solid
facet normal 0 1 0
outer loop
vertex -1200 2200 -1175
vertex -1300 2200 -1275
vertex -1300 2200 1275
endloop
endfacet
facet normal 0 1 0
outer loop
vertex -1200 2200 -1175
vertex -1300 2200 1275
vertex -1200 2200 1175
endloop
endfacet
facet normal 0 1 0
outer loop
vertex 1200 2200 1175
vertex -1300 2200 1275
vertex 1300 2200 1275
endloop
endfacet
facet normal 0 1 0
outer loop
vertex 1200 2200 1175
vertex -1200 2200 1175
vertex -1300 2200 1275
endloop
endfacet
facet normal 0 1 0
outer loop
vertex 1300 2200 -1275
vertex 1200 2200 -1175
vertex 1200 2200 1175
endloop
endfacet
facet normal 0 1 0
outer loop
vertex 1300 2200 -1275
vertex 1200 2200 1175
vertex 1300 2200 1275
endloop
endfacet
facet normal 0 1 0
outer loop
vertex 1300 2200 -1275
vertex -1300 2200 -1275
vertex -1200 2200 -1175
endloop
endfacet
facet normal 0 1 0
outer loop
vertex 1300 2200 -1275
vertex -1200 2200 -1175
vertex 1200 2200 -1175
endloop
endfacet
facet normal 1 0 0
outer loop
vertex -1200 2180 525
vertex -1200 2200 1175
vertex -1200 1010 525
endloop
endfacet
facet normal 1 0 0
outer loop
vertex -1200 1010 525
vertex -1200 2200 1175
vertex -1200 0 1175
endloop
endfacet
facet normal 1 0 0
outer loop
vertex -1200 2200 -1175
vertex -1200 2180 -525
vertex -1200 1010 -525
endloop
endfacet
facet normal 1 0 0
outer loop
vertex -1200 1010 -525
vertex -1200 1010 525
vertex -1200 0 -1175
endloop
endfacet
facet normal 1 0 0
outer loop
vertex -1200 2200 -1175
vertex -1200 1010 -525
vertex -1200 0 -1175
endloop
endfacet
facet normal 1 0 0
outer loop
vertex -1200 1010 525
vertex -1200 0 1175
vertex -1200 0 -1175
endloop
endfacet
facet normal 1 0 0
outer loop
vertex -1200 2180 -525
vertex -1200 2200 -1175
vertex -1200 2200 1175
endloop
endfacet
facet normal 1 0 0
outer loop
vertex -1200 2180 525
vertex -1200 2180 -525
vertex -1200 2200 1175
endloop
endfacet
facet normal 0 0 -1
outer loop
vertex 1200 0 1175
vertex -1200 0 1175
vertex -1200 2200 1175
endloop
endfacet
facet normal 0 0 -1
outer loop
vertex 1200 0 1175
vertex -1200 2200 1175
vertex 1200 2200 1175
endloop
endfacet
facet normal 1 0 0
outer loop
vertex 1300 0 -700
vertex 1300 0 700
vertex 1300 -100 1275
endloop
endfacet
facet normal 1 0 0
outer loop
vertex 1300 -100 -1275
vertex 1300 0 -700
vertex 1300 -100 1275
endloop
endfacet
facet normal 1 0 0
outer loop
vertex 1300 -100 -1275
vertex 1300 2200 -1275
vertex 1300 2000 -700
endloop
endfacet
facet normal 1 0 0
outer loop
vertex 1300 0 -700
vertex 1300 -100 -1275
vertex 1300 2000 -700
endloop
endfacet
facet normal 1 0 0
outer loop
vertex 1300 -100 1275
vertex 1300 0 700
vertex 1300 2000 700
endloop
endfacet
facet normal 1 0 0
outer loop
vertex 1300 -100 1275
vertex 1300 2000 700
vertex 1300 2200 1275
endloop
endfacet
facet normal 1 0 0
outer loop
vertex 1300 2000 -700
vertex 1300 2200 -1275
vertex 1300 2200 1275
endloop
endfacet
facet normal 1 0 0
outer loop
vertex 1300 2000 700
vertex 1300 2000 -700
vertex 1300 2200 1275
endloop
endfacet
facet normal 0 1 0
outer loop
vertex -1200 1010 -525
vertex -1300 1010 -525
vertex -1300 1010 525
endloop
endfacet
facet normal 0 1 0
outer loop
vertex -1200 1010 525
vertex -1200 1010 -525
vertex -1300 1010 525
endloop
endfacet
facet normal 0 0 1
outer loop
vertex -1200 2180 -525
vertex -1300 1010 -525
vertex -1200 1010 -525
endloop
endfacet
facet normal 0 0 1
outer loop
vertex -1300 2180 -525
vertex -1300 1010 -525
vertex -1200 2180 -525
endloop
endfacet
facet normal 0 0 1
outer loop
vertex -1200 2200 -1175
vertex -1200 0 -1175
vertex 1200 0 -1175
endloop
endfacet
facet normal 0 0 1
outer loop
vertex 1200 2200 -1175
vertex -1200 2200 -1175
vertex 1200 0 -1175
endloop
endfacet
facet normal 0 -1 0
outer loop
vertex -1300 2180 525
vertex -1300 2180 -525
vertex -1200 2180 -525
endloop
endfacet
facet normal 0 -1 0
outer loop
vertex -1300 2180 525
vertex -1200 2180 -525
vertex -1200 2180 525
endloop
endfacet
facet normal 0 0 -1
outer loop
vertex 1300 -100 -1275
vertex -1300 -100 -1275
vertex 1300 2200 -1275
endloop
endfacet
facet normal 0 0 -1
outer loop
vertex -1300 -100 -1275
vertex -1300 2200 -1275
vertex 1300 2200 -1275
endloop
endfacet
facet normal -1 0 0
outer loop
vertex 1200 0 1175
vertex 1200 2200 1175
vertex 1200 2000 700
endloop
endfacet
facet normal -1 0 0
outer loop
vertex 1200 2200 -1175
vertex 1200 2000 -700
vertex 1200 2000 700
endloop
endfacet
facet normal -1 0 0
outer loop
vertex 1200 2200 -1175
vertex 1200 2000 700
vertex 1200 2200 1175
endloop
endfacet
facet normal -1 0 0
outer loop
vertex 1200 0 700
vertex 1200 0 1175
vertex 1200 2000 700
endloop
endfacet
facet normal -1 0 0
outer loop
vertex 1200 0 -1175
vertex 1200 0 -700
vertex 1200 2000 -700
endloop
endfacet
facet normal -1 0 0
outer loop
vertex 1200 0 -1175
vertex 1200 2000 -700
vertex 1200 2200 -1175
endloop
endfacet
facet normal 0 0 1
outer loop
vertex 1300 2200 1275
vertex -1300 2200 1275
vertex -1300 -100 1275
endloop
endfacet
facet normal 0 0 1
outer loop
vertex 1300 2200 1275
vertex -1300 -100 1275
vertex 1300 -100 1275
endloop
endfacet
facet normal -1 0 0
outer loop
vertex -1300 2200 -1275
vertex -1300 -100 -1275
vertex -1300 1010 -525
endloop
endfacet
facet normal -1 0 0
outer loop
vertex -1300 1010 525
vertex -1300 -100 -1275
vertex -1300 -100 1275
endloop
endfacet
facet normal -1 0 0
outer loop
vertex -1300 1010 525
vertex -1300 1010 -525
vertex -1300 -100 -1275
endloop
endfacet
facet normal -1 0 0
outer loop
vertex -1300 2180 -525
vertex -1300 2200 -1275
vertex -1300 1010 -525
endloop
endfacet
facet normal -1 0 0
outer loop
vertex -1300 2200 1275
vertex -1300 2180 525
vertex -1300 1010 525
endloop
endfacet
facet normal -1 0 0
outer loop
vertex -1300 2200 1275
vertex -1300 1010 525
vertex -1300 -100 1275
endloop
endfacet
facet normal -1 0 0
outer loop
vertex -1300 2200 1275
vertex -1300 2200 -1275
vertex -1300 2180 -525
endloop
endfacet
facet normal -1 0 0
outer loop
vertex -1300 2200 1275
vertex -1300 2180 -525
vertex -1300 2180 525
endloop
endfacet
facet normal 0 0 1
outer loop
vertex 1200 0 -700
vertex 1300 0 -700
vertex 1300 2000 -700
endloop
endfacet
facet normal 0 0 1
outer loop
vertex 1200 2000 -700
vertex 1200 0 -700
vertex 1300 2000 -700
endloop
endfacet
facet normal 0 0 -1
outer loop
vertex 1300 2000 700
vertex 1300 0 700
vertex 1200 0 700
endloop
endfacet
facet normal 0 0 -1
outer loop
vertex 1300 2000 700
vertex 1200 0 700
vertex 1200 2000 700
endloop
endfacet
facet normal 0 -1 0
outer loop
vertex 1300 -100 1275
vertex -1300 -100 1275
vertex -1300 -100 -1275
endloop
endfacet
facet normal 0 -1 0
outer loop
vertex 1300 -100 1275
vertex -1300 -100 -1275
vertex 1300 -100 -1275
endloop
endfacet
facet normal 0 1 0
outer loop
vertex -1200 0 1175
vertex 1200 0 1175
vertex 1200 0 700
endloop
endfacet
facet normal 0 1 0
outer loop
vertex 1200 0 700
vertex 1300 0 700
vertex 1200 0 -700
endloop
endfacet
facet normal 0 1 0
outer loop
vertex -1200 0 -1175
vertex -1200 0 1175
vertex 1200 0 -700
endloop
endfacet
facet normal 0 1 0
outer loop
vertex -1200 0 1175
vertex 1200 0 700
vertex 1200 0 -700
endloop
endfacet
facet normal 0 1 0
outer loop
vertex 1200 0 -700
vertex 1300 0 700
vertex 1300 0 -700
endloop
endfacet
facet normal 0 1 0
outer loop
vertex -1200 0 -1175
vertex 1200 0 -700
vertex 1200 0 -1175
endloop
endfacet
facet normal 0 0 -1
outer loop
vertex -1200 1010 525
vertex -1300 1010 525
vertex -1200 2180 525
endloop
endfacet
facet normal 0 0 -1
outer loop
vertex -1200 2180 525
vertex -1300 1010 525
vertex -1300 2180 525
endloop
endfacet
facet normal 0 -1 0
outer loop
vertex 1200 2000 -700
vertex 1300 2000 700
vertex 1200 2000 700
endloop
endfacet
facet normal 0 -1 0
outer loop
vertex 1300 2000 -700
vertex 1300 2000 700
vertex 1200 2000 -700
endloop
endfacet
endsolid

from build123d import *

# Parameters (mm, degrees)
SKETCH_1_W             = 2600
SKETCH_1_H             = 2550
SKETCH_1_W_2           = 2400
SKETCH_1_H_2           = 2350
EXTRUDE_327_DEPTH      = 2200
SKETCH_2_W             = 2600
SKETCH_2_H             = 2550
EXTRUDE_523_DEPTH      = 100
CUT_EXTRUDE_725_REACH  = 3638.705
SKETCH_5_W             = 1400
SKETCH_5_H             = 2000
CUT_EXTRUDE_1054_REACH = 3638.705
SKETCH_6_W             = 1050
SKETCH_6_H             = 1170


with BuildPart() as part:
    # 스케치1 → Extrude 327 (new body)
    with BuildSketch(Plane(origin=(0, 0, 0), x_dir=(1, 0, 0), z_dir=(0, 1, 0))):
        Rectangle(SKETCH_1_W, SKETCH_1_H)
        Rectangle(SKETCH_1_W_2, SKETCH_1_H_2, mode=Mode.SUBTRACT)
    extrude(amount=EXTRUDE_327_DEPTH)

    # 스케치2 → Extrude 523 (add)
    with BuildSketch(Plane.XZ):
        Rectangle(SKETCH_2_W, SKETCH_2_H)
    extrude(amount=EXTRUDE_523_DEPTH)

    # 스케치5 → Cut-Extrude 725 (cut, up to next)
    with BuildSketch(Plane(origin=(1300, 0, 0), x_dir=(0, 0, -1), z_dir=(1, 0, 0)), mode=Mode.PRIVATE) as cut_extrude_725_sk1:
        with Locations((0, 1000)):
            Rectangle(SKETCH_5_W, SKETCH_5_H)
    cut_extrude_725_tool1 = extrude(cut_extrude_725_sk1.sketch, amount=-CUT_EXTRUDE_725_REACH, mode=Mode.PRIVATE) & part.part
    add(cut_extrude_725_tool1.solids().sort_by_distance((1300, 1000, 0))[0], mode=Mode.SUBTRACT)

    # 스케치6 → Cut-Extrude 1054 (cut, up to next)
    with BuildSketch(Plane.ZY.offset(1300), mode=Mode.PRIVATE) as cut_extrude_1054_sk1:
        with Locations((0, 1595)):
            Rectangle(SKETCH_6_W, SKETCH_6_H)
    cut_extrude_1054_tool1 = extrude(cut_extrude_1054_sk1.sketch, amount=-CUT_EXTRUDE_1054_REACH, mode=Mode.PRIVATE) & part.part
    add(cut_extrude_1054_tool1.solids().sort_by_distance((-1300, 1595, 0))[0], mode=Mode.SUBTRACT)


solid = part.part
